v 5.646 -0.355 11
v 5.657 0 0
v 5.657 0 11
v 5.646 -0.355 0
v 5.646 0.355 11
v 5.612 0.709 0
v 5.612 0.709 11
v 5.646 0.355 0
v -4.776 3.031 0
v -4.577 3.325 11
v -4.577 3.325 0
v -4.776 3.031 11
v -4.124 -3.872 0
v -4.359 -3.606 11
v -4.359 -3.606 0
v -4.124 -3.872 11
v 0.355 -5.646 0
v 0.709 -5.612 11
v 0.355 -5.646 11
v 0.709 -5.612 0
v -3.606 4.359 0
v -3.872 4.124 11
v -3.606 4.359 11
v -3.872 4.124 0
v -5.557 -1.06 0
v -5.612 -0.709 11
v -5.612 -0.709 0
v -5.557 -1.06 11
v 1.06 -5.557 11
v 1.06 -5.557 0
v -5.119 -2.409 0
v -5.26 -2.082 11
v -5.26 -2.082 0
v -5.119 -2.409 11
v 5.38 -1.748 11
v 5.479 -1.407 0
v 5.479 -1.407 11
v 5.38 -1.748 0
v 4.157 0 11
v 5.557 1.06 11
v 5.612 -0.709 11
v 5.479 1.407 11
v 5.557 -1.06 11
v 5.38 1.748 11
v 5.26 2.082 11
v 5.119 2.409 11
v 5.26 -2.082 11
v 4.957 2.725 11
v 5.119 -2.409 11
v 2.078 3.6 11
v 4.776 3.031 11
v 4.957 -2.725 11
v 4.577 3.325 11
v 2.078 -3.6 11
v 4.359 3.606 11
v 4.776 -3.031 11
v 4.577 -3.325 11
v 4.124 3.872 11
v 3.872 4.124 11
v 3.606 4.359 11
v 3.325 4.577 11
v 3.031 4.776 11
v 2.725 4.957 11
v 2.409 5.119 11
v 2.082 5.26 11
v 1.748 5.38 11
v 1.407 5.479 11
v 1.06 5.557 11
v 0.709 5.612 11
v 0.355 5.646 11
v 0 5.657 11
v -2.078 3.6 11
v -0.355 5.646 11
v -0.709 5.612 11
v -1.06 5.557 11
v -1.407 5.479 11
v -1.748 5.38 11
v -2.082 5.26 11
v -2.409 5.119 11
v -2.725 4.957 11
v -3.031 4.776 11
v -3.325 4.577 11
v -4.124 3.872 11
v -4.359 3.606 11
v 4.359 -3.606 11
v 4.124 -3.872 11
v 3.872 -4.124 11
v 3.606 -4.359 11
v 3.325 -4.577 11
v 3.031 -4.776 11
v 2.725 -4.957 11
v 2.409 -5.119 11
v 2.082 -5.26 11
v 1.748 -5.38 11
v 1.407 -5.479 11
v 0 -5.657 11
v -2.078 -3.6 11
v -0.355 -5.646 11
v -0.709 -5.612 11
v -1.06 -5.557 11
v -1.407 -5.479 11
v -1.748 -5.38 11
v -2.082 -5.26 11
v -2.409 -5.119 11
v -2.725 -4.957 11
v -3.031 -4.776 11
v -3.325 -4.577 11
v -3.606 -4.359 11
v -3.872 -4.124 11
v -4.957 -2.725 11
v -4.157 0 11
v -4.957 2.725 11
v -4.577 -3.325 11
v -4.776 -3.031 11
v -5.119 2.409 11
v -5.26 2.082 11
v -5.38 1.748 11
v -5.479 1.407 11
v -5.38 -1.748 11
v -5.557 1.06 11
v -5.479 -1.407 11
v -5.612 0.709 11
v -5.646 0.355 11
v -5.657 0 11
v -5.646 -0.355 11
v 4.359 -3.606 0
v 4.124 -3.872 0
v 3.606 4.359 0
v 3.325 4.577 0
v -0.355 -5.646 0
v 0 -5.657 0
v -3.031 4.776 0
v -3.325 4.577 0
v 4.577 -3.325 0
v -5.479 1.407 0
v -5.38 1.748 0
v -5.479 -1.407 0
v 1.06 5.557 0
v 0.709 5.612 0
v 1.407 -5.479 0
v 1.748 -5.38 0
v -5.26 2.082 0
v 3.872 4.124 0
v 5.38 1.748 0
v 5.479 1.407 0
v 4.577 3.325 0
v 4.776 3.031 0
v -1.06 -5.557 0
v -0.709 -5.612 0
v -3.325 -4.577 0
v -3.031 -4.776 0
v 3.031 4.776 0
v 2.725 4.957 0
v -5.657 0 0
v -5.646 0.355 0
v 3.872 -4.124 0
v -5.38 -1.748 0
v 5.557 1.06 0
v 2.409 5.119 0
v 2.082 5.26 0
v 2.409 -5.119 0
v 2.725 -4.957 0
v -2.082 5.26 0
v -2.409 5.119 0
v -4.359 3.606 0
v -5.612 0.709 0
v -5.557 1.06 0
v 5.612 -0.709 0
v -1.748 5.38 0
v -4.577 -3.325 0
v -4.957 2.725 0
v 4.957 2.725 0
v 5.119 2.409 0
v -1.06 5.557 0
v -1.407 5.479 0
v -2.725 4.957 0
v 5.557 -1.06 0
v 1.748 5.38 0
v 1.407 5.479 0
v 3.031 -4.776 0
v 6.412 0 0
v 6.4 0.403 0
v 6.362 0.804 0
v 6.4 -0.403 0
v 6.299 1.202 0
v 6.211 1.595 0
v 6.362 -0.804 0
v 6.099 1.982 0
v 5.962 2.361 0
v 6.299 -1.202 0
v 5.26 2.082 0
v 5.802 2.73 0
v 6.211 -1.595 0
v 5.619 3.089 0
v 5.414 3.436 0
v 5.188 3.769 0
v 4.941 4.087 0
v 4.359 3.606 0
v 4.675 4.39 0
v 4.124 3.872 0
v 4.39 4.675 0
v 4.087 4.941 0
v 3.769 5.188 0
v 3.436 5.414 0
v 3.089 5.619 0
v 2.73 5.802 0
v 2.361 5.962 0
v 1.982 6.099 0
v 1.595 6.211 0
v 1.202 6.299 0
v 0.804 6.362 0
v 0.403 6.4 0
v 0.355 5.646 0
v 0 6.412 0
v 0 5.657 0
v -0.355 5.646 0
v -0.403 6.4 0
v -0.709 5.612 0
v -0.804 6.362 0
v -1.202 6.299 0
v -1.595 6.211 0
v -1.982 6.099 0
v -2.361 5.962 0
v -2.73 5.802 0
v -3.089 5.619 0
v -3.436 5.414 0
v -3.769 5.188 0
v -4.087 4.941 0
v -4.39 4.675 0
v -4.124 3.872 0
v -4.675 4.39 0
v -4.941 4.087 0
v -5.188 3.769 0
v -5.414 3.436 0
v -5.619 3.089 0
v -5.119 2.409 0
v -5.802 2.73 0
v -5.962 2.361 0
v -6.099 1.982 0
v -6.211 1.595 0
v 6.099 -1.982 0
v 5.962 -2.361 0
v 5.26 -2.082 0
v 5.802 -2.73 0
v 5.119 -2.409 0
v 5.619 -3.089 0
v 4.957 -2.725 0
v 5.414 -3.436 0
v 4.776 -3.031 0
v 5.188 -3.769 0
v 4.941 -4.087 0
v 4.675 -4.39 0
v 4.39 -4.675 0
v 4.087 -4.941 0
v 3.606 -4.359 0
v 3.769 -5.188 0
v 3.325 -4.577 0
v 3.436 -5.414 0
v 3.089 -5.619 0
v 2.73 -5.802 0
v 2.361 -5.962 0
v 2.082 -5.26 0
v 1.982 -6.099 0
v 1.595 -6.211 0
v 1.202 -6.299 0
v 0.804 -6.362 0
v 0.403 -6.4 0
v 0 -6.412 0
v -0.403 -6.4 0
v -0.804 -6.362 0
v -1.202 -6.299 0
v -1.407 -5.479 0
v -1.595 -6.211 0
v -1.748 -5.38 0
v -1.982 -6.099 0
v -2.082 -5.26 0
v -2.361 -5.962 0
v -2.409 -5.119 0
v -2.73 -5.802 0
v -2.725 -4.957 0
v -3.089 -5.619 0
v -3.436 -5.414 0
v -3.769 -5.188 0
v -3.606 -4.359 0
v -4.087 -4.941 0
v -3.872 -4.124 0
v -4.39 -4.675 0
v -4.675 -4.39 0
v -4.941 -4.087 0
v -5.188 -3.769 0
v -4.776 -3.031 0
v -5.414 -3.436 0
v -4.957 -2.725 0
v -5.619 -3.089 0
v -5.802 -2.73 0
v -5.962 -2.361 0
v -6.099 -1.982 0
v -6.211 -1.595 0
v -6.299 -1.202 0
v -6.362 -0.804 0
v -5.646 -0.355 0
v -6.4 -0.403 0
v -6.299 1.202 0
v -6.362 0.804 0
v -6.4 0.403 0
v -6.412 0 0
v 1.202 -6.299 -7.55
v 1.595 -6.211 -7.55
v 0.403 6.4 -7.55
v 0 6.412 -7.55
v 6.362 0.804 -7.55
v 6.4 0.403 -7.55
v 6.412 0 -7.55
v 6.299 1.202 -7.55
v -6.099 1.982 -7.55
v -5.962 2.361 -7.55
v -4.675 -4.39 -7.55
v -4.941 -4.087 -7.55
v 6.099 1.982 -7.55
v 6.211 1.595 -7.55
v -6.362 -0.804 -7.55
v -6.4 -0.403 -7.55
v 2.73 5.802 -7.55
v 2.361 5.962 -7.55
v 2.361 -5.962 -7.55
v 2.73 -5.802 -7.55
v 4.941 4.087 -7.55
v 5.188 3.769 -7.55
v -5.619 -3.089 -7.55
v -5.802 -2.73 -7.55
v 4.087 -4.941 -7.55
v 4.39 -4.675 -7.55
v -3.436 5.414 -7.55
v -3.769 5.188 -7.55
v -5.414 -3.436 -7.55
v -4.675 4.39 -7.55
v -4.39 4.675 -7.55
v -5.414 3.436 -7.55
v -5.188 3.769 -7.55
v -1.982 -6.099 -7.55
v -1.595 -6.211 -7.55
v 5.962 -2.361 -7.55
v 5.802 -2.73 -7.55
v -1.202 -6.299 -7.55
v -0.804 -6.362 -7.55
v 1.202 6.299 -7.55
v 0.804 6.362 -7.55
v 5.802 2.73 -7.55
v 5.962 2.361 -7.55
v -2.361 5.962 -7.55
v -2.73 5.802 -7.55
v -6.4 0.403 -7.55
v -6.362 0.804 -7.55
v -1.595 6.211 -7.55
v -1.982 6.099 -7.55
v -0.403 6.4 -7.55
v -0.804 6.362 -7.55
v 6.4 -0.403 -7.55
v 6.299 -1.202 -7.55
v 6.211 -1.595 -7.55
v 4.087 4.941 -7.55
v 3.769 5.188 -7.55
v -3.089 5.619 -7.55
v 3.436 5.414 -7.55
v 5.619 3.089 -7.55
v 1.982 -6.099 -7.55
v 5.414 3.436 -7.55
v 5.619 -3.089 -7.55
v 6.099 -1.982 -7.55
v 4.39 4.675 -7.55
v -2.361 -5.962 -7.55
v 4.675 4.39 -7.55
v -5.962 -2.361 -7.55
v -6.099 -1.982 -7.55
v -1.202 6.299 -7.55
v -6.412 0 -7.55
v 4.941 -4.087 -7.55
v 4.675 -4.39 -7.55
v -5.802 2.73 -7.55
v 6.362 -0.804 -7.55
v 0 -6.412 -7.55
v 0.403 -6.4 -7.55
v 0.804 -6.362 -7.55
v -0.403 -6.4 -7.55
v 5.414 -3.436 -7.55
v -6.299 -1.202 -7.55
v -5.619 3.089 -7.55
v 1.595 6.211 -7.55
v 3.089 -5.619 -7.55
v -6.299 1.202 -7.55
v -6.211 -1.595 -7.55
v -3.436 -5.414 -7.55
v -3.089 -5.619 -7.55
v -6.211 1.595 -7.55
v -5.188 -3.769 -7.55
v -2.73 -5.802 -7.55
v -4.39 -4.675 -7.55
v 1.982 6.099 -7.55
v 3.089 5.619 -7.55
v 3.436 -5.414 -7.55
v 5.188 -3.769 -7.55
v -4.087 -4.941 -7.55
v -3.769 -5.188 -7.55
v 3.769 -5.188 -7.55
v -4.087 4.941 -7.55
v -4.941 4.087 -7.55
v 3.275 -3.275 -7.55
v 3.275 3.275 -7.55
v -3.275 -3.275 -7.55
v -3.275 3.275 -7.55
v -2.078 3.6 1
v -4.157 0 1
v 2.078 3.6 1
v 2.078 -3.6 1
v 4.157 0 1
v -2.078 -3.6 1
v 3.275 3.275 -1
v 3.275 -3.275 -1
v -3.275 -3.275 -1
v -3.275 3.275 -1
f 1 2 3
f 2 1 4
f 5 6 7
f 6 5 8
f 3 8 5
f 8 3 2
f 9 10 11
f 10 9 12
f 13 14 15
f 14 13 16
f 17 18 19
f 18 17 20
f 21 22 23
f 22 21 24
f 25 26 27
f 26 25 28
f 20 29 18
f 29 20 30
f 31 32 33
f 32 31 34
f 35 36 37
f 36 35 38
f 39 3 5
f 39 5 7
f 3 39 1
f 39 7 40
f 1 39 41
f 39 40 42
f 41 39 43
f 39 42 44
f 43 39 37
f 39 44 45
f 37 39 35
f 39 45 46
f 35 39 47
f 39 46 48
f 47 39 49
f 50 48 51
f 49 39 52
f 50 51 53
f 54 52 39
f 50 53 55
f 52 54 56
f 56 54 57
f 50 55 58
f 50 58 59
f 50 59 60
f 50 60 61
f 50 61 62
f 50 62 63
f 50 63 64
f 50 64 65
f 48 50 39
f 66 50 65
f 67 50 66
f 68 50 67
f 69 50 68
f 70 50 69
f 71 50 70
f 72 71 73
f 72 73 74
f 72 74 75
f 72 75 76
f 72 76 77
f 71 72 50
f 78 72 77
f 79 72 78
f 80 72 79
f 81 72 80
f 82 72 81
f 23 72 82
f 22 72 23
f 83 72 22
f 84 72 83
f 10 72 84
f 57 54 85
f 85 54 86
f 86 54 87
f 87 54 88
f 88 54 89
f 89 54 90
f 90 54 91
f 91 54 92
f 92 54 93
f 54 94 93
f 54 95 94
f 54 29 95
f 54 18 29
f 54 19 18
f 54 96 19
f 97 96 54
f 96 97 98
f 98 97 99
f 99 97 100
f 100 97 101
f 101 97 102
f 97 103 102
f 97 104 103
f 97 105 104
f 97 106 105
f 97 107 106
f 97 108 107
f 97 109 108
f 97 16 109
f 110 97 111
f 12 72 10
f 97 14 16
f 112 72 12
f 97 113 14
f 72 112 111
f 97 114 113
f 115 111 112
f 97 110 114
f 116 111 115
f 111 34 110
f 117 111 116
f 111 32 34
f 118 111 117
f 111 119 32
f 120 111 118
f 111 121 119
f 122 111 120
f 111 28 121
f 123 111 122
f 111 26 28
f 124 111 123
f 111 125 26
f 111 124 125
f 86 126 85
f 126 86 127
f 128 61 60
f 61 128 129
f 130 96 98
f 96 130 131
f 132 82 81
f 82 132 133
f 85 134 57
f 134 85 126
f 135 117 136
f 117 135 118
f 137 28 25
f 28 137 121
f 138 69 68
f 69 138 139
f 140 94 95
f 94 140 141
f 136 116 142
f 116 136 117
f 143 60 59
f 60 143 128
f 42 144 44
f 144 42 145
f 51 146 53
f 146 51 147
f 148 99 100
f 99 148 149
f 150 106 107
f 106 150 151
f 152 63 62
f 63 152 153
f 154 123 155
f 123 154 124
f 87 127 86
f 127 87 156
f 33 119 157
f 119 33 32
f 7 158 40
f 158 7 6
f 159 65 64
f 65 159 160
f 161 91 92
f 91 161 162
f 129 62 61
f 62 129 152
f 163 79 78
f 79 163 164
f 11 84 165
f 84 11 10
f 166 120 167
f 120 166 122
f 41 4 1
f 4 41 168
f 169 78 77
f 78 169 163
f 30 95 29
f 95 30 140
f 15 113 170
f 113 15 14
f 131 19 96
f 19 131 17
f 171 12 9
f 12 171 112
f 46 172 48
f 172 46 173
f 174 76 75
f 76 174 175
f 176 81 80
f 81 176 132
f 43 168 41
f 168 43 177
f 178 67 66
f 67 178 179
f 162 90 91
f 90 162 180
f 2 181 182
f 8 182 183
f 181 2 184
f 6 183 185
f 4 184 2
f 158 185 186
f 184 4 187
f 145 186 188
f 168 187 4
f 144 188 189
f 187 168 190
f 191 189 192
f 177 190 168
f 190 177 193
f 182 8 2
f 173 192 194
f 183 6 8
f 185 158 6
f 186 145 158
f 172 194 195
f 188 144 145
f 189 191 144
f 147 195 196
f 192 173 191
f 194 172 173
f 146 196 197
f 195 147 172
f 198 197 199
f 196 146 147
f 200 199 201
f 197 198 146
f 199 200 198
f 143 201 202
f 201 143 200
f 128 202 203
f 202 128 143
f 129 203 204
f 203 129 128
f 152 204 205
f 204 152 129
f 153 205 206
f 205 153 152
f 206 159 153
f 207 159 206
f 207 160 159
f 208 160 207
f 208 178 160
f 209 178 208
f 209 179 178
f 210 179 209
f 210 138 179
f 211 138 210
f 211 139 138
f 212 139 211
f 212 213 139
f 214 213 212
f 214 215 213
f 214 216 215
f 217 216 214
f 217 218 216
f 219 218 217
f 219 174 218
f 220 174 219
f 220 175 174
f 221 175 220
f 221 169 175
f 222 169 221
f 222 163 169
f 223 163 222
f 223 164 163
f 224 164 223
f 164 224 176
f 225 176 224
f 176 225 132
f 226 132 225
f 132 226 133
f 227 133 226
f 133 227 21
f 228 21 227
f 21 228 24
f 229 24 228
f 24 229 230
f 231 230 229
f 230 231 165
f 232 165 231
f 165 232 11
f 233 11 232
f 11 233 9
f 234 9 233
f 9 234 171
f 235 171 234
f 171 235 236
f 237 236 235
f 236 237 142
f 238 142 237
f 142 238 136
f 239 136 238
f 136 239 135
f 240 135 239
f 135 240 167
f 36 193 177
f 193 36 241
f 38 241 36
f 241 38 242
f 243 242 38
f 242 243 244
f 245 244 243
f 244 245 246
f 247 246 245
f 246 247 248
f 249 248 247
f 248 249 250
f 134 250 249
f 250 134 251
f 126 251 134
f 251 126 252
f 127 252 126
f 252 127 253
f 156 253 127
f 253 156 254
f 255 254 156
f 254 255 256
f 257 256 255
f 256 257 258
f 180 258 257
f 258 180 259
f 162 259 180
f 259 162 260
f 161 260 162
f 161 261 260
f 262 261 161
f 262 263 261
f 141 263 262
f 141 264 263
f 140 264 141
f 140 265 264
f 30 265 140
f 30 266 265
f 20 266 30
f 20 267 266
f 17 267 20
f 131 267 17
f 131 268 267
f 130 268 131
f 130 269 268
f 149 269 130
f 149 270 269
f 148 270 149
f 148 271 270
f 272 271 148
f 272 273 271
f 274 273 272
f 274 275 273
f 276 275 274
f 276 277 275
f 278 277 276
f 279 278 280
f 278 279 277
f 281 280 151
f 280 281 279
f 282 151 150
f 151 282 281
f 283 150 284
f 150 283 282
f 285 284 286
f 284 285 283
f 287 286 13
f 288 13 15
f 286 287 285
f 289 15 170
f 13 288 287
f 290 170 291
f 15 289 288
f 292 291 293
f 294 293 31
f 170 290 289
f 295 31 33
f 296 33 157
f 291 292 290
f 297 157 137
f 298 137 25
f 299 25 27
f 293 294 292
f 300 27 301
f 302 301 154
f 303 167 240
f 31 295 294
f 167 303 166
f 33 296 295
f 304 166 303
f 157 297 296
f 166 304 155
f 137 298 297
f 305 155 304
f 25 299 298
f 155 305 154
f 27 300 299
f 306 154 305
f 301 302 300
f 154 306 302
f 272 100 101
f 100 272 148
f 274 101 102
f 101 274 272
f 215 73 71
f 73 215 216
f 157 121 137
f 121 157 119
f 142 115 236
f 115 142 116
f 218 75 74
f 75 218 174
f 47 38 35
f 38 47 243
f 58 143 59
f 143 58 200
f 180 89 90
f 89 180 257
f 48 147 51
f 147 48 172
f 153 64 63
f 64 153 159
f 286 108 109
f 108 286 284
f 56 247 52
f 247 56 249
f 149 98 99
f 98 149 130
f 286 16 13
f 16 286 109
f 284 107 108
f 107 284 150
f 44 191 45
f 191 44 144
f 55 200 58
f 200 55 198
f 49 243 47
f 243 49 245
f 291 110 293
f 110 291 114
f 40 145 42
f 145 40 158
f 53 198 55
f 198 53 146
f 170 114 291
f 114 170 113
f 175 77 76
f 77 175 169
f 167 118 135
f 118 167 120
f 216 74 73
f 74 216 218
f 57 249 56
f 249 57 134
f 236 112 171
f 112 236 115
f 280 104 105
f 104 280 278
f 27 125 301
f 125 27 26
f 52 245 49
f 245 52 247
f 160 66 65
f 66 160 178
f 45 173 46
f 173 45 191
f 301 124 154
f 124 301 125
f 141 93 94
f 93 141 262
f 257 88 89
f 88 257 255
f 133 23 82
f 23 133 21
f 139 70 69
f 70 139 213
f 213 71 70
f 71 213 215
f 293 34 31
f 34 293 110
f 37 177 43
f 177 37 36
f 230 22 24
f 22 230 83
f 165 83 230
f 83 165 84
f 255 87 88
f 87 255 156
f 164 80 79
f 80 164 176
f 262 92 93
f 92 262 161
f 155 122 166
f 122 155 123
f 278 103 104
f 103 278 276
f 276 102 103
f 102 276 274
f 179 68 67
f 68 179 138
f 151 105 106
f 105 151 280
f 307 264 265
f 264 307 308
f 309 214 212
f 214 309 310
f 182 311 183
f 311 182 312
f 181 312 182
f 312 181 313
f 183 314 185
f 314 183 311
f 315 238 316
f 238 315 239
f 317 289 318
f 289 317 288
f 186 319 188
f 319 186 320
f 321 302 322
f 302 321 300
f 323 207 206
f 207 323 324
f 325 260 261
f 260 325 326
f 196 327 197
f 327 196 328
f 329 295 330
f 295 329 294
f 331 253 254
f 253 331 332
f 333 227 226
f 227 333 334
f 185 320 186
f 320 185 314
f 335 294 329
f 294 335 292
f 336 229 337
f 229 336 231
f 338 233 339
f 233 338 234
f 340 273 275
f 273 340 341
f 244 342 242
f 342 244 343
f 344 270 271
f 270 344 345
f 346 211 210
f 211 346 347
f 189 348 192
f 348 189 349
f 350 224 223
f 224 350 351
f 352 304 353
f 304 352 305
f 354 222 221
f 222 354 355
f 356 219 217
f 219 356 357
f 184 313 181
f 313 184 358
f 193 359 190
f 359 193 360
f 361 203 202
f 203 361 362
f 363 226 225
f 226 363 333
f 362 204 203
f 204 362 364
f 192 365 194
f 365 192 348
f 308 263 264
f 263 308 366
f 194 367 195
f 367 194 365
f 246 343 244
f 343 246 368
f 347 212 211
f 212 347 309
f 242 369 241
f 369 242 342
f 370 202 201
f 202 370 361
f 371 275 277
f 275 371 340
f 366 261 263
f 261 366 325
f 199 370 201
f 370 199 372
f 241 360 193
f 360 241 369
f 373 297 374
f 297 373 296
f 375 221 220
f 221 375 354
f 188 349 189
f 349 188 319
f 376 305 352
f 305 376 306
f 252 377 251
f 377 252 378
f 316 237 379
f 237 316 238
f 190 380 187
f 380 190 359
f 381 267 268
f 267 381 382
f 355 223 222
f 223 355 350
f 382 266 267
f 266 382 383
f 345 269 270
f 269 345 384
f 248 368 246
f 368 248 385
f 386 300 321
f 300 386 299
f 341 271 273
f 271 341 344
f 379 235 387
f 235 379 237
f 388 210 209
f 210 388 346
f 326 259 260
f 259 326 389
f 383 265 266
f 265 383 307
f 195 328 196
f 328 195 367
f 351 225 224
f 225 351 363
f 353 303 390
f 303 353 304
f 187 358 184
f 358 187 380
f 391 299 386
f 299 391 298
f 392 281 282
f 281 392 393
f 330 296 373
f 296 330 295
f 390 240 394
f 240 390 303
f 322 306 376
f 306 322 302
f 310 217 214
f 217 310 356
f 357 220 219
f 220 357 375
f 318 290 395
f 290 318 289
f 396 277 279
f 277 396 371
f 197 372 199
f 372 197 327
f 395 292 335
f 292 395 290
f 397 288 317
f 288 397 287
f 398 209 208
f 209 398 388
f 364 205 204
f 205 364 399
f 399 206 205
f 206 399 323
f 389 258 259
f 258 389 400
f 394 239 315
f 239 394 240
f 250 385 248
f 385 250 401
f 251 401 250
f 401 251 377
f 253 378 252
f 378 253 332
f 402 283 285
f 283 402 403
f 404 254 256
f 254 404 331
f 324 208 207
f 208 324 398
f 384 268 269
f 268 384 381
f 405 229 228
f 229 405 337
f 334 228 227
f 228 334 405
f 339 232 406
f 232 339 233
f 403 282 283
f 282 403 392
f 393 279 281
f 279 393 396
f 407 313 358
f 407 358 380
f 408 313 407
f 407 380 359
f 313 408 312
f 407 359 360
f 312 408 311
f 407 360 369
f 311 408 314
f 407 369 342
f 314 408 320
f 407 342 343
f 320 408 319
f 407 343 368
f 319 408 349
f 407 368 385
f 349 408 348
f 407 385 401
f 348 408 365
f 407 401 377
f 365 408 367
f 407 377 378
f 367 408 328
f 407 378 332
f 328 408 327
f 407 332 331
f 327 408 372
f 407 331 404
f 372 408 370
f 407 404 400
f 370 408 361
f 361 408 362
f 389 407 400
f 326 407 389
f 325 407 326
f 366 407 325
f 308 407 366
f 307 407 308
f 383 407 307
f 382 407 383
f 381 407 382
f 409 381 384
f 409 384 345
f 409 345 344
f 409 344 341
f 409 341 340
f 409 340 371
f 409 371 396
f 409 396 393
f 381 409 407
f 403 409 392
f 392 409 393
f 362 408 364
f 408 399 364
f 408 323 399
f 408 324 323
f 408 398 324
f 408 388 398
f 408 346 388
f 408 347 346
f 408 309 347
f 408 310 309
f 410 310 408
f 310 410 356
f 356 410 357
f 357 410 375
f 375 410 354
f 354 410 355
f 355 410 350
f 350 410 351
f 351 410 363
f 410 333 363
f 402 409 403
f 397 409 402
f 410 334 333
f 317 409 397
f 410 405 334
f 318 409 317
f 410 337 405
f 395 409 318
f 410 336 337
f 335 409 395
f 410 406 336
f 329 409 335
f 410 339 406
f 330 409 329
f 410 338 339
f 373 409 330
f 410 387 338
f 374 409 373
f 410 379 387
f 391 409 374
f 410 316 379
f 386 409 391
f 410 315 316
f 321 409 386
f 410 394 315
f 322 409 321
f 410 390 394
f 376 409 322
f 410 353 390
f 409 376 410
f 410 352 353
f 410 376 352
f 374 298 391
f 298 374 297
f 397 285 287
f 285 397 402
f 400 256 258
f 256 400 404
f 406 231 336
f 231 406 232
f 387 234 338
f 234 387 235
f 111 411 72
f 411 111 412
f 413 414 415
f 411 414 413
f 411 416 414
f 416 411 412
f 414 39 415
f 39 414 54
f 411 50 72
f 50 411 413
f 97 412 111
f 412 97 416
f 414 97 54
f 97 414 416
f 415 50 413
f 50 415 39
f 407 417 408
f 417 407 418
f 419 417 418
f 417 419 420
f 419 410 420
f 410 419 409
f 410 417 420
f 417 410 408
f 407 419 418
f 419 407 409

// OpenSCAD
// Customizable sockets v2 Improved
// http://www.thingiverse.com/thing:1240520
// Hacked up and improved by
// by infinigrove Squirrel Master 2016 (http://www.thingiverse.com/infinigrove)
//
//
// Remix of Parametric hex socket
// http://www.thingiverse.com/thing:91496
// Originally
// by Dale Price http://www.thingiverse.com/daprice
//

// diameter of hole across-flats
socket_size = 7;
// type of socket
socket_type = 6; // [6:hex-6, 4:square-8, 12:12 point]
// wall thickness of socket
socket_wall_thickness = 3; // [1:0.5:16]
// depth of socket
depth = 10; // [5:80]
// size of drive
drive_size = 6.35; // [6.35:1/4", 9.525:3/8", 12.7:1/2", 19.05:3/4", 25.4:1"]
// wall thickness of drive
drive_wall_thickness = 3; // [1:0.5:16]
// drive and socket size tolerance
tolerance = 0.2;
// socket detail
socket_detail = 100; // [30:180]

/* [Hidden] */

tolSize = socket_size + tolerance;
inscribedSize = tolSize/0.866025;
tolDrive = drive_size + tolerance;

socketRadius = (inscribedSize+socket_wall_thickness)/2;
driveRadius = ((tolDrive*1.5)+drive_wall_thickness)/2;

difference()
{
	union()
	{
		//socket portion
		translate([0,0,(depth+1)/2])
		cylinder(h = depth + 1, r = socketRadius, center = true, $fn = socket_detail);

		//drive portion
		translate([0,0,0-((tolDrive + 1) / 2)])
		cylinder(h = tolDrive + 1, r = driveRadius, center = true, $fn = socket_detail);
	}
	
	//socket hole
    if (socket_type == 12){
        //12 point socket
        translate([0,0,1]) linear_extrude(height = depth, center = false) circle(r = inscribedSize/2, $fn = 6);
        rotate([0,0,30])translate([0,0,1]) linear_extrude(height = depth, center = false) circle(r = inscribedSize/2, $fn = 6);
        
    } else {
        // 6 or 8 point
	translate([0,0,1])
	linear_extrude(height = depth, center = false)
	circle(r = inscribedSize/2, $fn = socket_type);
       // second part for 8 point
    if (socket_type == 4)rotate([0,0,45])translate([0,0,1])
	linear_extrude(height = depth, center = false)
	circle(r = inscribedSize/2, $fn = socket_type);
    }

	//drive hole
	translate([0,0,0-(tolDrive/2)-1])
	cube(size = tolDrive, center = true);
}
